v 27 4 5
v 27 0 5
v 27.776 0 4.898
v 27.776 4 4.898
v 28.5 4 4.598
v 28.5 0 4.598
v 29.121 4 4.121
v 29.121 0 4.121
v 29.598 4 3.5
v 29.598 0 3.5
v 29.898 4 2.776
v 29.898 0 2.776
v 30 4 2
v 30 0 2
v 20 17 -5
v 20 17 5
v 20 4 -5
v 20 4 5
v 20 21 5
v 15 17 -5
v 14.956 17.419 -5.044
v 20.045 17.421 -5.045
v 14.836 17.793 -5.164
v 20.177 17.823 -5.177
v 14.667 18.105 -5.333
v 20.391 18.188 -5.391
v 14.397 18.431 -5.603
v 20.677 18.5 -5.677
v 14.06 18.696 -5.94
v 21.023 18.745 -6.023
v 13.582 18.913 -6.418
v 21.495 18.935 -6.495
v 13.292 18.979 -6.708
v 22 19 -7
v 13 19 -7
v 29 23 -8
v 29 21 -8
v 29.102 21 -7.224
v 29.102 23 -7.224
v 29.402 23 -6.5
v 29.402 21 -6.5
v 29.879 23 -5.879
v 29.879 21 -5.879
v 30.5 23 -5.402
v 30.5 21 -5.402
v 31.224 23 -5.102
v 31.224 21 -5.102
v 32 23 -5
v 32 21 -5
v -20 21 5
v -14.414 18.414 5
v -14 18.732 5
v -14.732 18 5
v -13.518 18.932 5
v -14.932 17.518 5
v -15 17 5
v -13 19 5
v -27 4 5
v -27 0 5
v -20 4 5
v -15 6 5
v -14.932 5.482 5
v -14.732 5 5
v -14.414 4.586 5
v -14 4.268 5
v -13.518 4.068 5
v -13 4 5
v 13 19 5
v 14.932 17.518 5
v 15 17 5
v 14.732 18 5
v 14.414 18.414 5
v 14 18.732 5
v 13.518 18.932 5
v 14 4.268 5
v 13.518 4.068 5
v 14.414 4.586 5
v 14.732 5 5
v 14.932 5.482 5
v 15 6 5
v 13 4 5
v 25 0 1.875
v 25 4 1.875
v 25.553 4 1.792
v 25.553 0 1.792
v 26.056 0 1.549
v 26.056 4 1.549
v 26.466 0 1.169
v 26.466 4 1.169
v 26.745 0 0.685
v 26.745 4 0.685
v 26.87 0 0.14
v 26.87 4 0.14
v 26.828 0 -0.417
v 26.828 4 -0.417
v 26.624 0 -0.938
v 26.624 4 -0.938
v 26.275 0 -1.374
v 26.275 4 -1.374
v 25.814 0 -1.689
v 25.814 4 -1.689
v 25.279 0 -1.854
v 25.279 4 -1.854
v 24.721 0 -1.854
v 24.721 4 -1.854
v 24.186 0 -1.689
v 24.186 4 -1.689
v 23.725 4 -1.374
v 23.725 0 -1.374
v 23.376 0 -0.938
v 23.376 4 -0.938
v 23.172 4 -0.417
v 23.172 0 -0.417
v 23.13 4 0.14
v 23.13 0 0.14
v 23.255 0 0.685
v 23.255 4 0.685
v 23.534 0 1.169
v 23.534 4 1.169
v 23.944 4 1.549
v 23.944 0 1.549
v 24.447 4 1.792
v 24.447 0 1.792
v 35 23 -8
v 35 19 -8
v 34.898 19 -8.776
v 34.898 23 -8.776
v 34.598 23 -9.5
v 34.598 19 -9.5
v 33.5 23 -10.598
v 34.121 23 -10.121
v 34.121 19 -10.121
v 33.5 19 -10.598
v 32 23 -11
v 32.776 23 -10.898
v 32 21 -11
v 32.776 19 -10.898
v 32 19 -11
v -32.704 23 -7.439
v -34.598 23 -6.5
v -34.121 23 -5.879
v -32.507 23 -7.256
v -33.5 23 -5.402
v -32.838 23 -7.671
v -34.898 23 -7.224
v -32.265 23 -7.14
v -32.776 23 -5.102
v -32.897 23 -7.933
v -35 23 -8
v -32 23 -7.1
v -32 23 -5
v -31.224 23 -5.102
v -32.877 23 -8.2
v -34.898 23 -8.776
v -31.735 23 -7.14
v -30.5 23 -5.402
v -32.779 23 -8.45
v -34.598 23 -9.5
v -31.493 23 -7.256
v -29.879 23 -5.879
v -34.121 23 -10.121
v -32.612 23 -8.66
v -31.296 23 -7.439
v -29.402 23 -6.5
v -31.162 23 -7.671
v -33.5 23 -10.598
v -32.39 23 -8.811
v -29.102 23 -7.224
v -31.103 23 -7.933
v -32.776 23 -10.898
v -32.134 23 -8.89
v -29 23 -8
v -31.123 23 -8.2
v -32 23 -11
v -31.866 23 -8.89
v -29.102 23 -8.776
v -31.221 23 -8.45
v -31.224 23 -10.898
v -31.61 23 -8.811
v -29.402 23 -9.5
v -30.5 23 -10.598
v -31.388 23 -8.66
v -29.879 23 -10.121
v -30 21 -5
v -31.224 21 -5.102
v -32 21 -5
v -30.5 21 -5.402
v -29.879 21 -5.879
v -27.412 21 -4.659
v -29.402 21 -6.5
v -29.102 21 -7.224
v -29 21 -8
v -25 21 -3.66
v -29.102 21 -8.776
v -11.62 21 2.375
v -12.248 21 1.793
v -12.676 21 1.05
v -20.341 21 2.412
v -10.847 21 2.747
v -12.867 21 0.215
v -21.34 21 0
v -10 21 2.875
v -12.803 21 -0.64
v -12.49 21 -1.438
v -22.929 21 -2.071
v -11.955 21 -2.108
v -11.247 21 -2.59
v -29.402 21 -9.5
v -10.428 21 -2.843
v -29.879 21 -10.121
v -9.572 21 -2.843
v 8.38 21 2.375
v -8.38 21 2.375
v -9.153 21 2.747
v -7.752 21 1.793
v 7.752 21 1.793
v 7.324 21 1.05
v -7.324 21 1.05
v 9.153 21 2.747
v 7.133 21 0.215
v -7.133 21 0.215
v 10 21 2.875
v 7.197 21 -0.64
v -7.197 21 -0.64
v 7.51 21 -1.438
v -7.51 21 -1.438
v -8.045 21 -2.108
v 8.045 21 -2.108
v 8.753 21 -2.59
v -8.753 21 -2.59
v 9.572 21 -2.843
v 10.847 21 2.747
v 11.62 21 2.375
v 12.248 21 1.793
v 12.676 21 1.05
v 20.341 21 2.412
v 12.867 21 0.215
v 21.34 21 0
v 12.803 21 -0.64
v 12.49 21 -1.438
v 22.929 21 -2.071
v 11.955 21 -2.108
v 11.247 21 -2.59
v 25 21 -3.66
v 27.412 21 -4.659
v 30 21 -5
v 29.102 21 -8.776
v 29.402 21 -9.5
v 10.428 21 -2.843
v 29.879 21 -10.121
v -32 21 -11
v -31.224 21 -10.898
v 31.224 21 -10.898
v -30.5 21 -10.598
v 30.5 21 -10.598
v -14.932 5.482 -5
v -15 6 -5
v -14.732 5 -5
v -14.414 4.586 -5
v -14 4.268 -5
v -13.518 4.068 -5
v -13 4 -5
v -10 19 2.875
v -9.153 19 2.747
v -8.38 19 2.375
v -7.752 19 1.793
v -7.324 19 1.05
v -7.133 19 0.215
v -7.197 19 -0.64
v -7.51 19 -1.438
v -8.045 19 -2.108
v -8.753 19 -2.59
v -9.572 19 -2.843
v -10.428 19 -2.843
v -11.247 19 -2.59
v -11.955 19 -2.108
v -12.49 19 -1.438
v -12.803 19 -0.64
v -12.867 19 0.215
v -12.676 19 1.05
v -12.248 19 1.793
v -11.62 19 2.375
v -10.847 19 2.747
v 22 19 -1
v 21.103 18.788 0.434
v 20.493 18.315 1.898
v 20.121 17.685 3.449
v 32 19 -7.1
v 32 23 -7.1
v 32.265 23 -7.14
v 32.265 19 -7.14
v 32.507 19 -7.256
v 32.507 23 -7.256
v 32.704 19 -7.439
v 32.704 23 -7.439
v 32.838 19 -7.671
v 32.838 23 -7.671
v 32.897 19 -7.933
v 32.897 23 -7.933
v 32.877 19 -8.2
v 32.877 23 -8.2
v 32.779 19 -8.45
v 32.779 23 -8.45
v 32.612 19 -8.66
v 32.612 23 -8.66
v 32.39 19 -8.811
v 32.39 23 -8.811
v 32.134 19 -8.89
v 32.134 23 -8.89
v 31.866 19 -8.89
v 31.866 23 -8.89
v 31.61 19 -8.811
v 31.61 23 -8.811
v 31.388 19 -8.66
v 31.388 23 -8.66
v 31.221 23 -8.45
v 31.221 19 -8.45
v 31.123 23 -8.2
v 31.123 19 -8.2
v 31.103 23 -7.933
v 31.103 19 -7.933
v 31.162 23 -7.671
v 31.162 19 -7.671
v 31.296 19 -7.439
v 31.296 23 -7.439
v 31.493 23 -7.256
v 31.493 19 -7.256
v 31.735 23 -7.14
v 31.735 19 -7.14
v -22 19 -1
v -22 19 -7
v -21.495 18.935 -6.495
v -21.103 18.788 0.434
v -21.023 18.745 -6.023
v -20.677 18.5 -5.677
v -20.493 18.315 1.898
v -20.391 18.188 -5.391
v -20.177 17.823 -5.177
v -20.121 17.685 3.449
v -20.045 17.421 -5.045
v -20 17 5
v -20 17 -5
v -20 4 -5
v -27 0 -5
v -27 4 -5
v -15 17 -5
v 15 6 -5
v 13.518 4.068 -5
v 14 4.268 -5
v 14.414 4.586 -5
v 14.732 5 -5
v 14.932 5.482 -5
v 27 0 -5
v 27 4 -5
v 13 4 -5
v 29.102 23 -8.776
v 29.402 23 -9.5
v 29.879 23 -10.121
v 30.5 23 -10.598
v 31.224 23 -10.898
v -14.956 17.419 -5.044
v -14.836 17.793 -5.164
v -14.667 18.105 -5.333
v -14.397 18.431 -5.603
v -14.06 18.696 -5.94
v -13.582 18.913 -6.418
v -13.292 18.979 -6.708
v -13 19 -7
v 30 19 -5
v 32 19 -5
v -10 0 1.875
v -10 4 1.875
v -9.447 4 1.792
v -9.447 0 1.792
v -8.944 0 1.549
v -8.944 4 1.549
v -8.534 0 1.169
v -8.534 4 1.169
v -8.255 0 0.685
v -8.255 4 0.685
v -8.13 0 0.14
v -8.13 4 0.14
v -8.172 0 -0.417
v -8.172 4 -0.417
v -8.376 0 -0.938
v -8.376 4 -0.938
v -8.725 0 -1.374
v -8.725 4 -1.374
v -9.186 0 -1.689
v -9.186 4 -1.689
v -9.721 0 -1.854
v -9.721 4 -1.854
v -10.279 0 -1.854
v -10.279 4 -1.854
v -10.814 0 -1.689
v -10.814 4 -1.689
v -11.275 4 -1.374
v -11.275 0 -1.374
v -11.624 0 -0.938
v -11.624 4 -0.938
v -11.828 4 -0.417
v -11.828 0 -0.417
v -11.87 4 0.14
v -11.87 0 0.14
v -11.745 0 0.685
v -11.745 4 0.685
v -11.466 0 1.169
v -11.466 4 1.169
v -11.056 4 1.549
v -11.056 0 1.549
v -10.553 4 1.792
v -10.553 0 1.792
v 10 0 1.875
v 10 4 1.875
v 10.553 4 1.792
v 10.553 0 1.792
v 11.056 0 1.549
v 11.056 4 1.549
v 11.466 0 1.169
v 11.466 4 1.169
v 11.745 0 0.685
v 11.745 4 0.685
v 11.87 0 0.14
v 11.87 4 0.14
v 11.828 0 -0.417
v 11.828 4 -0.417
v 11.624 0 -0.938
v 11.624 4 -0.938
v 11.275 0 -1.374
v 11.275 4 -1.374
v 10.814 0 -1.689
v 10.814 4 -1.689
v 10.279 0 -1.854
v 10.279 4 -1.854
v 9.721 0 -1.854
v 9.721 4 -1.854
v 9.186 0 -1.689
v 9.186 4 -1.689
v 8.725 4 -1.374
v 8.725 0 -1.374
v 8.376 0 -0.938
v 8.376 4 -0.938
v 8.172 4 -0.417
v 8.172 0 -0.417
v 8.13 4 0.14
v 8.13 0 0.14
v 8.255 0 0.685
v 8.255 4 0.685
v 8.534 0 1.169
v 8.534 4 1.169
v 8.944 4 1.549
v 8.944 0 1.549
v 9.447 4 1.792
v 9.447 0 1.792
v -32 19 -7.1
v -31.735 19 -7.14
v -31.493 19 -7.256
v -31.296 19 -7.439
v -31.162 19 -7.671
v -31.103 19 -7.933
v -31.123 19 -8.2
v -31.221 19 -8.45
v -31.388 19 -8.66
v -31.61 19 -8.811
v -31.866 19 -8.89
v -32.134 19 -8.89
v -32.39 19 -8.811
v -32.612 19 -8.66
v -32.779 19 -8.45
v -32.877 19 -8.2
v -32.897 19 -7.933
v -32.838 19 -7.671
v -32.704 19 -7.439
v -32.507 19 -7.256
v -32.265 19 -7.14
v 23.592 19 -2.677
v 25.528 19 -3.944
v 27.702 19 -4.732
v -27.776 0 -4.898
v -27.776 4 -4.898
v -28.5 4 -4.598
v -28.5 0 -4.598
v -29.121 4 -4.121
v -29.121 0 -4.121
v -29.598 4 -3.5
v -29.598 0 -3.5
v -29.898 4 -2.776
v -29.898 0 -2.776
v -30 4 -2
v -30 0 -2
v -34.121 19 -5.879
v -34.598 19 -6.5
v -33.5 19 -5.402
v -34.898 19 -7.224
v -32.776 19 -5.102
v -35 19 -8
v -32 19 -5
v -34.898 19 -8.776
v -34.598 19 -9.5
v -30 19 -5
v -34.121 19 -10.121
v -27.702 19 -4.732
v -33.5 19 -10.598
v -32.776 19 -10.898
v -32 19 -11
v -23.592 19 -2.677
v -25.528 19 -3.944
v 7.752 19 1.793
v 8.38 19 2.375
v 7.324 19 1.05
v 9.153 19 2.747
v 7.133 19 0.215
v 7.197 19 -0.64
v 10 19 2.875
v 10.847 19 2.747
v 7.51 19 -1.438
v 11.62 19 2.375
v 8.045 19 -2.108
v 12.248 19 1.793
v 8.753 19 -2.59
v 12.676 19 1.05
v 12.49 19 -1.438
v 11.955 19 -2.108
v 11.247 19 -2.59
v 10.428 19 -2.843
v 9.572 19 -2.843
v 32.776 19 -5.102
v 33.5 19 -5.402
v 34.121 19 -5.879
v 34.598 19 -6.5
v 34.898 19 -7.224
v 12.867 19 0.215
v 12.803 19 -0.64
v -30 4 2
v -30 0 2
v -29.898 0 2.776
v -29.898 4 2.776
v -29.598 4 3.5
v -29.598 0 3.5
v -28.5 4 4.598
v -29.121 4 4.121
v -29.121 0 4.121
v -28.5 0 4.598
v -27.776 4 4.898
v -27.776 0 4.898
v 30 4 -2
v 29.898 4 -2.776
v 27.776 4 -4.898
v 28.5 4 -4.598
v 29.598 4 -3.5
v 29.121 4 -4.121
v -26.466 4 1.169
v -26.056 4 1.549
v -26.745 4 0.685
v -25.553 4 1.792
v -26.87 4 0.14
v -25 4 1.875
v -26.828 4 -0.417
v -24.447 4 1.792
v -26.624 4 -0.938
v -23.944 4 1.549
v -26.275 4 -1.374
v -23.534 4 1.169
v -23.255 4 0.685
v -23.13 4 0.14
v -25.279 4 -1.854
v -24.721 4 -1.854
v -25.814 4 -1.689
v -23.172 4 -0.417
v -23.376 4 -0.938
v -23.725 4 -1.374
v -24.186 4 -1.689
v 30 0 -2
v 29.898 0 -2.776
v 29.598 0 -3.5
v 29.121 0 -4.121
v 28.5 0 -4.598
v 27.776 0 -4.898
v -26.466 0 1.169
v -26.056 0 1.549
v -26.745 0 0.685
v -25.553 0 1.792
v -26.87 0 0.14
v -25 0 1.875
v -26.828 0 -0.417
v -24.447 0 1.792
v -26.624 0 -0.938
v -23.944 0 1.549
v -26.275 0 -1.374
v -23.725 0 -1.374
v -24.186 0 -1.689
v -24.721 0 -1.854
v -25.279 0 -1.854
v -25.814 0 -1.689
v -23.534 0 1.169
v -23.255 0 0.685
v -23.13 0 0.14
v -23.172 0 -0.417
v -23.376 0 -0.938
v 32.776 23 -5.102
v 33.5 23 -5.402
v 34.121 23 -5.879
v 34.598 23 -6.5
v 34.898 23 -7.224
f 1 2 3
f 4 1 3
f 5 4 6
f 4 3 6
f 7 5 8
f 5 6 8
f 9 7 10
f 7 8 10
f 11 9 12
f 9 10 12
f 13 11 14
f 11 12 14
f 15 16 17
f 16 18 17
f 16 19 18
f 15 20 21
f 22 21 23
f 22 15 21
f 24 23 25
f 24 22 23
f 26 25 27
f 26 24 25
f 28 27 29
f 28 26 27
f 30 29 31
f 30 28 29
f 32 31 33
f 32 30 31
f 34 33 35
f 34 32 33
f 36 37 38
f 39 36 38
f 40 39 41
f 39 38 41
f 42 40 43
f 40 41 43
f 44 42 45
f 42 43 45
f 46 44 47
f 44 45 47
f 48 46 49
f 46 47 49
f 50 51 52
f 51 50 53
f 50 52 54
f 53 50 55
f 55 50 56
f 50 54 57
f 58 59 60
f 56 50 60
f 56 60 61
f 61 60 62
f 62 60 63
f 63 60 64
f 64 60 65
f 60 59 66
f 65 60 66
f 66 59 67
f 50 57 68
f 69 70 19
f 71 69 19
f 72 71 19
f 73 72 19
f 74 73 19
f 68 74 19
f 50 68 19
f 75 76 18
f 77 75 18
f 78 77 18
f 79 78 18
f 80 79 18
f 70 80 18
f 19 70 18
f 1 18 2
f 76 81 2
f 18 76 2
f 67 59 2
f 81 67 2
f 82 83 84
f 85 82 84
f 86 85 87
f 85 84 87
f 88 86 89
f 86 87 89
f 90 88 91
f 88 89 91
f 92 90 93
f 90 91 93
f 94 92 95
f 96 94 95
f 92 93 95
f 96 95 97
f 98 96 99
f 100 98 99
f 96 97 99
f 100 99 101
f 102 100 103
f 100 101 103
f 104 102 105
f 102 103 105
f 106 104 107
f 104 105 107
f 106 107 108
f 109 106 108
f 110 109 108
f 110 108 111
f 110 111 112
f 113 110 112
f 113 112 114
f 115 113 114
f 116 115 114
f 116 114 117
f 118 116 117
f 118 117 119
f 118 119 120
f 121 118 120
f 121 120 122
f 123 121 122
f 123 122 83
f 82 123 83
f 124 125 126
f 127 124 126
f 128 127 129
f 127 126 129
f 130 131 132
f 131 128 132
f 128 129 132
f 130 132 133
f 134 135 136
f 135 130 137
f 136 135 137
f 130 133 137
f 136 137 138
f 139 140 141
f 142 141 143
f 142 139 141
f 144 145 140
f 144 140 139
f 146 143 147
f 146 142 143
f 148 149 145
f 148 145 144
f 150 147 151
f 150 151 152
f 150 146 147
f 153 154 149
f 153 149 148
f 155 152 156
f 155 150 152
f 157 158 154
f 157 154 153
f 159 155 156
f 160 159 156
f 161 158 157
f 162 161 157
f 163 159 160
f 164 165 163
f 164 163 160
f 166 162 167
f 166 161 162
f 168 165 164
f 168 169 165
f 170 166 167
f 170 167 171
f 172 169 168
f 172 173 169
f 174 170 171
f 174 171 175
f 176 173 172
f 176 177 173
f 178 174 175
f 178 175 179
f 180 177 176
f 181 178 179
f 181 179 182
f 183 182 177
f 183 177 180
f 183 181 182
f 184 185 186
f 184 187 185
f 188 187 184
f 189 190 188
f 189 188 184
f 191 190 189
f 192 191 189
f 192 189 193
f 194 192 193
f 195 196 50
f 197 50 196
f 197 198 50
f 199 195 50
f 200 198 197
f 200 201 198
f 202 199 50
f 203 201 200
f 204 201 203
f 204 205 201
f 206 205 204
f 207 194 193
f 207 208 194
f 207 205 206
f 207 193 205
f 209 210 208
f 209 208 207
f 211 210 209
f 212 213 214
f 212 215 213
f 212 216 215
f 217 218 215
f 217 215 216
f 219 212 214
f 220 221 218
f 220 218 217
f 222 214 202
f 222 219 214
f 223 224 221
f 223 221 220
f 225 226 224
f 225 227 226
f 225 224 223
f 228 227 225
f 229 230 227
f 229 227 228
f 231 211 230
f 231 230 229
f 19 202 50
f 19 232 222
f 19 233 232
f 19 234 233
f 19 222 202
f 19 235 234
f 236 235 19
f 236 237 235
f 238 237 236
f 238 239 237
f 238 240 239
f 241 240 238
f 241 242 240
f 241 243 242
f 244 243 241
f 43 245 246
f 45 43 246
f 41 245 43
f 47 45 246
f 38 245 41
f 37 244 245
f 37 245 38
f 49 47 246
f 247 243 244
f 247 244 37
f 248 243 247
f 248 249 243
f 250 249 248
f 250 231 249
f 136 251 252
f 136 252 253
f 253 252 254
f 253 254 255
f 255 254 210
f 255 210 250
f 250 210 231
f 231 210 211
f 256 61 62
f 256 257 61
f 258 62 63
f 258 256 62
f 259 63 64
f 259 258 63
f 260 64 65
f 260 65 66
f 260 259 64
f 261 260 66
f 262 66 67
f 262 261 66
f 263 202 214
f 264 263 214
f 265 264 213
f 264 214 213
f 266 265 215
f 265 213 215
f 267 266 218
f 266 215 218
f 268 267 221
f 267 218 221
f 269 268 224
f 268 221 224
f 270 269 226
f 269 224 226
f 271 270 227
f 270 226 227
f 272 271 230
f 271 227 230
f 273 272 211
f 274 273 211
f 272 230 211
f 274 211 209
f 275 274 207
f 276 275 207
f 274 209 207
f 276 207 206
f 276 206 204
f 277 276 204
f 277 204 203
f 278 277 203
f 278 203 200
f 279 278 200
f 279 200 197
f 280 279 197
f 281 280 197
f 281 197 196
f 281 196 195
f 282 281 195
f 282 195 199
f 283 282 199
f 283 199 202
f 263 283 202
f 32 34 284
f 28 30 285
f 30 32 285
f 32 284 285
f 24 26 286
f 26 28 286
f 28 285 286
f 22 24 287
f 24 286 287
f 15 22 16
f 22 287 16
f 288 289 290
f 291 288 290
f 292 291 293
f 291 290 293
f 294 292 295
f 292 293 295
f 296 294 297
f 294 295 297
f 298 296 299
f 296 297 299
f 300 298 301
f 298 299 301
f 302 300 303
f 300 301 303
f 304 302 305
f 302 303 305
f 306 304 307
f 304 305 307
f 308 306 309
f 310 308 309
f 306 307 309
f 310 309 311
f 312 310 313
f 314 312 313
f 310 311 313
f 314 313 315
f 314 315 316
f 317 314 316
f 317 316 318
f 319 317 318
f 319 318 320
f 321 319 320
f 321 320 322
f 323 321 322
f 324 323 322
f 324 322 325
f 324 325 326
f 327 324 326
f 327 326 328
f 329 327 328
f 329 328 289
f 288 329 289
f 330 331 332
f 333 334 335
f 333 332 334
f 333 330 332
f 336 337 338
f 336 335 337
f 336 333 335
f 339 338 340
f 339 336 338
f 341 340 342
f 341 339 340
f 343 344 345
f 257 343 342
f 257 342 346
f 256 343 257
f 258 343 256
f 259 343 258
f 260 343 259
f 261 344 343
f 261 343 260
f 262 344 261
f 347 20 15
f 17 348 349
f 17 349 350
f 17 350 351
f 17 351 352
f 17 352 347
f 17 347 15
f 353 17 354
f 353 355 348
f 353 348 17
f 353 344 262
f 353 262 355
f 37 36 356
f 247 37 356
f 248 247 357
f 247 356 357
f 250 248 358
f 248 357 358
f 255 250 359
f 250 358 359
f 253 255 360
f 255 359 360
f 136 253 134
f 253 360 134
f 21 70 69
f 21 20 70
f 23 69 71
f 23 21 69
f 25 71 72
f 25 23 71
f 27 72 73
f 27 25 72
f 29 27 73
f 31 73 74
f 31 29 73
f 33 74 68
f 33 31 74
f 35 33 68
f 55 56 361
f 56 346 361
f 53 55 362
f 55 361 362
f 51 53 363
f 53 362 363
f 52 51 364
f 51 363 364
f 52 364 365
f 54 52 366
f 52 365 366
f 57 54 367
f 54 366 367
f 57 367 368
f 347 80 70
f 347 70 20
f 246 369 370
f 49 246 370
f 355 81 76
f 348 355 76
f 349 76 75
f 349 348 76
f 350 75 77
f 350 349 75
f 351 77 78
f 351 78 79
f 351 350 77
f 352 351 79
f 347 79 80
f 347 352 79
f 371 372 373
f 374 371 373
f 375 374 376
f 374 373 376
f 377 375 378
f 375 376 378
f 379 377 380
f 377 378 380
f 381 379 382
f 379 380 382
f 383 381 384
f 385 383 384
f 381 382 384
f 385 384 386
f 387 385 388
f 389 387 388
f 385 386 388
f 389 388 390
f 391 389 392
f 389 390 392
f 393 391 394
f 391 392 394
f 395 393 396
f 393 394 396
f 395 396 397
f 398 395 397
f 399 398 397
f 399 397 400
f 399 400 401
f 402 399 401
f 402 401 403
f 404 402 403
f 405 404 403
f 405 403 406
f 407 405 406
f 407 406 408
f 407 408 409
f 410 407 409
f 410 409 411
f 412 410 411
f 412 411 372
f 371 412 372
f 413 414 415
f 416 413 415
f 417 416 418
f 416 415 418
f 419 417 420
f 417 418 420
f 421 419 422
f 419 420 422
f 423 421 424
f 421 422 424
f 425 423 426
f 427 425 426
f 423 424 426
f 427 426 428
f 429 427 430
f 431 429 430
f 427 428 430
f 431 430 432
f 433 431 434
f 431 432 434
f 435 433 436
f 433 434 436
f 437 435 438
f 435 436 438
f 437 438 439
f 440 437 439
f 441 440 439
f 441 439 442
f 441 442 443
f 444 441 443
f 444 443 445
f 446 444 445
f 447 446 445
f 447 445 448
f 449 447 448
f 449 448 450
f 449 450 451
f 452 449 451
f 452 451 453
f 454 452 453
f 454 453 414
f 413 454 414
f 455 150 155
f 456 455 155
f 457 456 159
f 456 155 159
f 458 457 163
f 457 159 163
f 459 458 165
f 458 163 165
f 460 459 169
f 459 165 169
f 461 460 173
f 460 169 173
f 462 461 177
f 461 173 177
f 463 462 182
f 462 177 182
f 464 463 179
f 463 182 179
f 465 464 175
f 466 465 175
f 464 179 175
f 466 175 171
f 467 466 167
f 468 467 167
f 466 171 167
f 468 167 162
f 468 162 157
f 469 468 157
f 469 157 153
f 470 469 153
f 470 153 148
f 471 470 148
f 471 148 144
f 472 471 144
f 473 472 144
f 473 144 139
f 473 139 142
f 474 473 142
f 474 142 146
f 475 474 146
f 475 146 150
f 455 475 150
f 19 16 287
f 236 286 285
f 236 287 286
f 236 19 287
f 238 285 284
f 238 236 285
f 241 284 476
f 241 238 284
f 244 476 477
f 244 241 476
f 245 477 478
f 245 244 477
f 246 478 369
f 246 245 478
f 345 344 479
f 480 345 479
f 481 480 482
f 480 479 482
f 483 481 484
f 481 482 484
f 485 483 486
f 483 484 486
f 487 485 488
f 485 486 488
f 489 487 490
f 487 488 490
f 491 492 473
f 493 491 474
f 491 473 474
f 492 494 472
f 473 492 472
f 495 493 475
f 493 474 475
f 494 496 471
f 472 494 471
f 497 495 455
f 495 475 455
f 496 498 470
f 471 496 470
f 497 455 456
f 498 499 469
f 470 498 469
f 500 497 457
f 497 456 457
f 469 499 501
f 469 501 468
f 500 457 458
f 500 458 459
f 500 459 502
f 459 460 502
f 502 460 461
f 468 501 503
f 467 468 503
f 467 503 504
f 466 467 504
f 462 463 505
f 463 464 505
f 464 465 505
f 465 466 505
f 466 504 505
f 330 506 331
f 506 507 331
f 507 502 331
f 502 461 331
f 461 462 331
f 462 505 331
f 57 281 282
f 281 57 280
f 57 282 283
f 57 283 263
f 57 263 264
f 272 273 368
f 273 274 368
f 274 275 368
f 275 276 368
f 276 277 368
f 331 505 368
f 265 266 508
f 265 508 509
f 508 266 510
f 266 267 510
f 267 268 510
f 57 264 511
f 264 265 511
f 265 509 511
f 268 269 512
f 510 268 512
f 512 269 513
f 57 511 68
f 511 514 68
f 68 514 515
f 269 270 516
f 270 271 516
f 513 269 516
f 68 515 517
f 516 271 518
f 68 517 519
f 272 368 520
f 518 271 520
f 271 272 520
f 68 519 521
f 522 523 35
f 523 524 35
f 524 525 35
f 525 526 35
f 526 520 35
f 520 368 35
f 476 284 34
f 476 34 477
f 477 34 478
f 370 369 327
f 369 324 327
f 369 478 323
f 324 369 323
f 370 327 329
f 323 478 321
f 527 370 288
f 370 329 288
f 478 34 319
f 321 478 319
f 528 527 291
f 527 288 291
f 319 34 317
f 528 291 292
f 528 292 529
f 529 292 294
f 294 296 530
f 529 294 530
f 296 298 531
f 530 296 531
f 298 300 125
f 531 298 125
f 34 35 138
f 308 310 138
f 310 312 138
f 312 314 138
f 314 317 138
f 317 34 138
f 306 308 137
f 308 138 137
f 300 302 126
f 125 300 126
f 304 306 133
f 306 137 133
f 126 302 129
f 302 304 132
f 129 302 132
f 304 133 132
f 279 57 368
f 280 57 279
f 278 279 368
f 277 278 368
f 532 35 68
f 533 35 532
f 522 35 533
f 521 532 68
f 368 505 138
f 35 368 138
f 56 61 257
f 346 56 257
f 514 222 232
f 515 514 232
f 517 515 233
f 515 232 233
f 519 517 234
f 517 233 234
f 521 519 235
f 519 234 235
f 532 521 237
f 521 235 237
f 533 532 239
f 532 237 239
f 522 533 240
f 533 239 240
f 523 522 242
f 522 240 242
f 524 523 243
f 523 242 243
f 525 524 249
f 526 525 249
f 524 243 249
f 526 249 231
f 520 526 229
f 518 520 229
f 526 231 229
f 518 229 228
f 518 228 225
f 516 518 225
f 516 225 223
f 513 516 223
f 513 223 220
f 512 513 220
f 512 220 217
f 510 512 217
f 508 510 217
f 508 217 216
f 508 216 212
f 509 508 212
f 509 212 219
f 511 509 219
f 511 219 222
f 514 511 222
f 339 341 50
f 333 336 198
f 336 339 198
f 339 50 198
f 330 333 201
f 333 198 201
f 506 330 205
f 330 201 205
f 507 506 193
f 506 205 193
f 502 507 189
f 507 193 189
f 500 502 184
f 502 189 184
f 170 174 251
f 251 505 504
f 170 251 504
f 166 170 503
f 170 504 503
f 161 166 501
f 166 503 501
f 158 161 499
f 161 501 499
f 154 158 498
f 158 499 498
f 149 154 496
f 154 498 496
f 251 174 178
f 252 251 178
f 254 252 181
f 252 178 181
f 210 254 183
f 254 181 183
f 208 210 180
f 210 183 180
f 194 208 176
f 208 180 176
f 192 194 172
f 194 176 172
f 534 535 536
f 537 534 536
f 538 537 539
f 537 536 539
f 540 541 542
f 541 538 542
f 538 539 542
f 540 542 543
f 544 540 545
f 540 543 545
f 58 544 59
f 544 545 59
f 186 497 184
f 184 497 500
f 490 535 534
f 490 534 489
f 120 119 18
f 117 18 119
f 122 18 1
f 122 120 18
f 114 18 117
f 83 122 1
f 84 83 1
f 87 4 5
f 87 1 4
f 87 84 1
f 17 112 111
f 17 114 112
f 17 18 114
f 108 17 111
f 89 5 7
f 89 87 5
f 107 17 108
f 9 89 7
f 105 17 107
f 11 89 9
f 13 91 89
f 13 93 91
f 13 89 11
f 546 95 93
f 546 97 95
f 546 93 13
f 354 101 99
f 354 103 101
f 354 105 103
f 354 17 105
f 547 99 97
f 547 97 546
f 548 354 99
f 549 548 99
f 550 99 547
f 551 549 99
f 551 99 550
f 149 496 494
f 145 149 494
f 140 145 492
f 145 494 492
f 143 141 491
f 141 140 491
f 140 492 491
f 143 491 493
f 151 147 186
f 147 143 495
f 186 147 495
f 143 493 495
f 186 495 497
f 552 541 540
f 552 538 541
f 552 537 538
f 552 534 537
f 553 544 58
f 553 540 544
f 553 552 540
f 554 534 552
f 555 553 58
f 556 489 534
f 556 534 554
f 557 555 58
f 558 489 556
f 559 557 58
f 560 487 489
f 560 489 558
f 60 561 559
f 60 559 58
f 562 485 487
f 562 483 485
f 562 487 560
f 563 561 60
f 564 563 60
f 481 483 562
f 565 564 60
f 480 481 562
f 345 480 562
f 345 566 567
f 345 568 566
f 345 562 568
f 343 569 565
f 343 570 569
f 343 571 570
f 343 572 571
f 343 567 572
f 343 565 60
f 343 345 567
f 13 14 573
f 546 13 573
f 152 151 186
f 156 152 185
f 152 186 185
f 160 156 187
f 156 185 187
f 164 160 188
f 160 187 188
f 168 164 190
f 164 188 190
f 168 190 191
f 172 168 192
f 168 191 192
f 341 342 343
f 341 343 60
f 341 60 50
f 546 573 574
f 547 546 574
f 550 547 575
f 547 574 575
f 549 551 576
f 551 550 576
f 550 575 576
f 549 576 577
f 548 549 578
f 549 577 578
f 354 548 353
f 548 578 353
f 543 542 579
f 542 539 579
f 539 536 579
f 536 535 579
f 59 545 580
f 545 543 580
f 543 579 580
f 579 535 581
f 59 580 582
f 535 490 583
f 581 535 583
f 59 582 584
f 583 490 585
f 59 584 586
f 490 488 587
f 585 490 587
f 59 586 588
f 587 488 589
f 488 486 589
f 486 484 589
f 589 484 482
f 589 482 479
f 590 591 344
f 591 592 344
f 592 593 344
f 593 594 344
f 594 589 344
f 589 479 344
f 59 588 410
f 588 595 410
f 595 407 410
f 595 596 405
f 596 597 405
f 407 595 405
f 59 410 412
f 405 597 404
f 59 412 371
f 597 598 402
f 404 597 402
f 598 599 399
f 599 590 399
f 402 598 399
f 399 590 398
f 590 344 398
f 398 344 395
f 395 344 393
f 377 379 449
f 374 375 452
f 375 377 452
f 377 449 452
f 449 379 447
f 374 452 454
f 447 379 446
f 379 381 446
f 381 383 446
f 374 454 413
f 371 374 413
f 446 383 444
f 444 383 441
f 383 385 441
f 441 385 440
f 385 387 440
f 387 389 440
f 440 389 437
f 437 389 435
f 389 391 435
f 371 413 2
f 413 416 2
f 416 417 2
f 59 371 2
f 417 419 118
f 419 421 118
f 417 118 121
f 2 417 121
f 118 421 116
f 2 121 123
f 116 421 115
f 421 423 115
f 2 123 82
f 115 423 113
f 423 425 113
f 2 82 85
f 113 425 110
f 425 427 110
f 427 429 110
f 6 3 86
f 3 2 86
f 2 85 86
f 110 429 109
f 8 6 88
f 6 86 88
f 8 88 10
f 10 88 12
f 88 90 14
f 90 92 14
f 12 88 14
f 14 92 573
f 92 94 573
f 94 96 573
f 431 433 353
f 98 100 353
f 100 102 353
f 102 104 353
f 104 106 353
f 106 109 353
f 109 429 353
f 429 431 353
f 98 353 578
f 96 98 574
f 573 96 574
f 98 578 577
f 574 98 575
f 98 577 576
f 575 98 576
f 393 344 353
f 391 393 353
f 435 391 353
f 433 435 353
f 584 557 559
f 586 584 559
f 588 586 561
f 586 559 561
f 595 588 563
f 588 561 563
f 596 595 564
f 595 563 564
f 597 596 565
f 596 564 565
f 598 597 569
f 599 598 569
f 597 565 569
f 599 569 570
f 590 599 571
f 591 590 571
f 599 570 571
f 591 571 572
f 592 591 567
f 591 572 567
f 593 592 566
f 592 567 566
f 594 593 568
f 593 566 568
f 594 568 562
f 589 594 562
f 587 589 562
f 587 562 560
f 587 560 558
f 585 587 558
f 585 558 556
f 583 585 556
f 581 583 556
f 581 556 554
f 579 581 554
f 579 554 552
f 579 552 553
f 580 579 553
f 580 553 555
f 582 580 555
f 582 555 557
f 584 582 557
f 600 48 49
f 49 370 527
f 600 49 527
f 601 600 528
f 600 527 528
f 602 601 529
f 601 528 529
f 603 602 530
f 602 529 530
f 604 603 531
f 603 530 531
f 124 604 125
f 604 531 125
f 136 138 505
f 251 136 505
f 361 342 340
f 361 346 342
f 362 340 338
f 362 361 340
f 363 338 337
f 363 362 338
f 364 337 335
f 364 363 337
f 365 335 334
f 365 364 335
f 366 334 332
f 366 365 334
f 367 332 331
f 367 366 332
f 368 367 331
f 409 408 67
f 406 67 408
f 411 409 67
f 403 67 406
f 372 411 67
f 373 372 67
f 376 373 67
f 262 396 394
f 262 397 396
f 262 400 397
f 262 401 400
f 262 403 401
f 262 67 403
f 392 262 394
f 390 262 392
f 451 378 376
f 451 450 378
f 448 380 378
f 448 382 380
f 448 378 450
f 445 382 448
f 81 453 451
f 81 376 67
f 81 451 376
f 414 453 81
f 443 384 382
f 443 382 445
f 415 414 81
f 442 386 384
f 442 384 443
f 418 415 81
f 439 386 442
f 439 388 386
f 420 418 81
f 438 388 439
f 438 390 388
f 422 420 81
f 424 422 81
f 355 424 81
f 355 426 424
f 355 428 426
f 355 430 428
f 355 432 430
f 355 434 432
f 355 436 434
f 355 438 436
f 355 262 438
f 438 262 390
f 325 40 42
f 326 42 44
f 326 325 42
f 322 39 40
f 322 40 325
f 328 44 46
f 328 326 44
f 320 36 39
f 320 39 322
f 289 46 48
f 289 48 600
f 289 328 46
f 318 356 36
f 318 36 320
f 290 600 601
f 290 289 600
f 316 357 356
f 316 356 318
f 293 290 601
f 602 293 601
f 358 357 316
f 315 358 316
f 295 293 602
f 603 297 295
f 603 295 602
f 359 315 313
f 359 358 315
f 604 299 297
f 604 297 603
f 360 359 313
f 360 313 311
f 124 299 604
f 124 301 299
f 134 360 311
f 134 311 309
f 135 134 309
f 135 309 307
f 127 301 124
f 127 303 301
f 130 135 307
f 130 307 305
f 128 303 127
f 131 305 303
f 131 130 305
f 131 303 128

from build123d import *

# Parameters (mm, degrees)
SKETCH1_W           = 60
SKETCH1_H           = 10
BOSS_EXTRUDE1_DEPTH = 4
SKETCH2_R           = 1.875
CUT_EXTRUDE1_DEPTH  = 31.6757233
SKETCH4_W           = 5
SKETCH4_H           = 10
BOSS_EXTRUDE2_DEPTH = 15
BOSS_EXTRUDE3_DEPTH = 4
SKETCH7_W           = 58
SKETCH7_H           = 6
CUT_EXTRUDE2_DEPTH  = 2
SKETCH9_W           = 40
SKETCH9_H           = 10
CUT_EXTRUDE3_DEPTH  = 2
CUT_EXTRUDE5_REACH  = 44.273
SKETCH10_R          = 2.875
FILLET1_R           = 10
FILLET2_R           = 3
FILLET3_R           = 2
SKETCH8_R           = 0.9
CUT_EXTRUDE4_DEPTH  = 44.301270189
FILLET4_R           = 2


# Some blends are built 0.0001 mm under size
with BuildPart() as part:
    # Sketch1 → Boss-Extrude1 (new body)
    with BuildSketch(Plane(origin=(0, 0, 0), x_dir=(1, 0, 0), z_dir=(0, 1, 0))):
        Rectangle(SKETCH1_W, SKETCH1_H)
    extrude(amount=BOSS_EXTRUDE1_DEPTH)

    # Sketch2 → Cut-Extrude1 (cut, through all)
    with BuildSketch(Plane(origin=(0, 4, 0), x_dir=(1, 0, 0), z_dir=(0, 1, 0))):
        with Locations(Location((-25, 0, 0), (0, 0, 270))):
            Circle(SKETCH2_R)
        with Locations(Location((-10, 0, 0), (0, 0, 270))):
            Circle(SKETCH2_R)
        with Locations(Location((10, 0, 0), (0, 0, 270))):
            Circle(SKETCH2_R)
        with Locations(Location((25, 0, 0), (0, 0, 270))):
            Circle(SKETCH2_R)
    extrude(amount=-CUT_EXTRUDE1_DEPTH, mode=Mode.SUBTRACT)

    # Sketch4 → Boss-Extrude2 (add)
    with BuildSketch(Plane(origin=(0, 4, 0), x_dir=(1, 0, 0), z_dir=(0, 1, 0))):
        with Locations((-17.5, 0)):
            Rectangle(SKETCH4_W, SKETCH4_H)
        with Locations((17.5, 0)):
            Rectangle(SKETCH4_W, SKETCH4_H)
    extrude(amount=BOSS_EXTRUDE2_DEPTH)

    # Sketch5 → Boss-Extrude3 (add)
    with BuildSketch(Plane(origin=(0, 19, 0), x_dir=(1, 0, 0), z_dir=(0, 1, 0))):
        Polygon((-20, -5), (20, -5), (20, 5), (35, 5), (35, 11), (-35, 11), (-35, 5), (-20, 5), align=None)
    extrude(amount=BOSS_EXTRUDE3_DEPTH)

    # Sketch7 → Cut-Extrude2 (cut)
    with BuildSketch(Plane(origin=(0, 23, 0), x_dir=(1, 0, 0), z_dir=(0, 1, 0))):
        with Locations((0, 8)):
            Rectangle(SKETCH7_W, SKETCH7_H)
    extrude(amount=-CUT_EXTRUDE2_DEPTH, mode=Mode.SUBTRACT)

    # Sketch9 → Cut-Extrude3 (cut)
    with BuildSketch(Plane(origin=(0, 23, 0), x_dir=(1, 0, 0), z_dir=(0, 1, 0))):
        Rectangle(SKETCH9_W, SKETCH9_H)
    extrude(amount=-CUT_EXTRUDE3_DEPTH, mode=Mode.SUBTRACT)

    # Sketch10 → Cut-Extrude5 (cut, up to next)
    with BuildSketch(Plane(origin=(0, 21, 0), x_dir=(1, 0, 0), z_dir=(0, 1, 0)), mode=Mode.PRIVATE) as cut_extrude5_sk1:
        with Locations(Location((-10, 0, 0), (0, 0, 270))):
            Circle(SKETCH10_R)
    cut_extrude5_tool1 = extrude(cut_extrude5_sk1.sketch, amount=-CUT_EXTRUDE5_REACH, mode=Mode.PRIVATE) & part.part
    # Sketch10 → Cut-Extrude5 (cut, up to next)
    with BuildSketch(Plane(origin=(0, 21, 0), x_dir=(1, 0, 0), z_dir=(0, 1, 0)), mode=Mode.PRIVATE) as cut_extrude5_sk2:
        with Locations(Location((10, 0, 0), (0, 0, 270))):
            Circle(SKETCH10_R)
    cut_extrude5_tool2 = extrude(cut_extrude5_sk2.sketch, amount=-CUT_EXTRUDE5_REACH, mode=Mode.PRIVATE) & part.part
    add(cut_extrude5_tool1.solids().sort_by_distance((-10, 21, 0))[0], mode=Mode.SUBTRACT)
    add(cut_extrude5_tool2.solids().sort_by_distance((10, 21, 0))[0], mode=Mode.SUBTRACT)

    # Fillet1
    fillet1_edges = [part.edges().sort_by_distance(p)[0] for p in [
        (20, 20, -5),
        (-20, 20, -5),
    ]]
    fillet(fillet1_edges, radius=FILLET1_R - 0.0001)  # a hair under: the kernel refuses the full size

    # Fillet2
    # the kernel refuses this fillet: 3 mm, written as the material it takes off along each edge
    with BuildSketch(Plane(origin=(30, -7.5, -5), x_dir=(-1, 0, 0), z_dir=(0, 1, 0)), Plane(origin=(-30, -7.5, 5), x_dir=(1, 0, 0), z_dir=(0, 1, 0)), Plane(origin=(-35, 11.5, -5), x_dir=(1, 0, 0), z_dir=(0, 1, 0)), Plane(origin=(35, 11.5, -11), x_dir=(-1, 0, 0), z_dir=(0, 1, 0))) as fillet2_piece_1:
        with BuildLine():
            CenterArc((FILLET2_R, FILLET2_R), FILLET2_R, 180, 90)
            Line((0, FILLET2_R), (0, 0))
            Line((0, 0), (FILLET2_R, 0))
        make_face()
    fillet2_piece_1_solid = extrude(amount=19, mode=Mode.PRIVATE)
    with BuildSketch(Plane(origin=(30, -7.5, 5), x_dir=(-1, 0, 0), z_dir=(0, 1, 0)), Plane(origin=(-30, -7.5, -5), x_dir=(1, 0, 0), z_dir=(0, 1, 0)), Plane(origin=(-35, 11.5, -11), x_dir=(1, 0, 0), z_dir=(0, 1, 0)), Plane(origin=(35, 11.5, -5), x_dir=(-1, 0, 0), z_dir=(0, 1, 0))) as fillet2_piece_2:
        with BuildLine():
            CenterArc((FILLET2_R, -FILLET2_R), FILLET2_R, 90, 90)
            Line((0, -FILLET2_R), (0, 0))
            Line((0, 0), (FILLET2_R, 0))
        make_face()
    fillet2_piece_2_solid = extrude(amount=19, mode=Mode.PRIVATE)
    with BuildSketch(Plane(origin=(-29, 30.5, -11), x_dir=(0, 0, 1), z_dir=(0, -1, 0)), Plane(origin=(29, 30.5, -11), x_dir=(1, 0, 0), z_dir=(0, -1, 0))) as fillet2_piece_3:
        with BuildLine():
            CenterArc((FILLET2_R, FILLET2_R), FILLET2_R, 180, 90)
            Line((0, FILLET2_R), (0, 0))
            Line((0, 0), (FILLET2_R, 0))
        make_face()
    fillet2_piece_3_solid = extrude(amount=9.5, mode=Mode.PRIVATE)
    with BuildSketch(Plane(origin=(-29, 21, -4.949883917), x_dir=(-0.9998604946563736, 0, -0.016703030428994153), z_dir=(0, 1, 0))) as fillet2_piece_4:
        with BuildLine():
            CenterArc((3.050527666, -2.999581484), FILLET2_R, 90.957057654, 90)
            Line((0.050946182, -3.049690575), (-0.249011967, -3.054701484))
            Line((-0.249011967, -3.054701484), (-0.299958148, -0.005010909))
            Line((-0.299958148, -0.005010909), (0.025007319, 0.298955906))
            ThreePointArc((0.025007319, 0.298955906), (0.99558669, 0.266550417), (2.995407665, 0.299958148))
            Line((2.995407665, 0.299958148), (3.000418574, 0))
        make_face()
    fillet2_piece_4_solid = extrude(amount=9.625290207, mode=Mode.PRIVATE)
    with BuildSketch(Plane(origin=(29, 21, -4.949883917), x_dir=(0.9998604946563736, 0, -0.01670303042899439), z_dir=(0, 1, 0))) as fillet2_piece_5:
        with BuildLine():
            CenterArc((3.050527666, 2.999581484), FILLET2_R, 179.042942346, 90)
            Line((0.050946182, 3.049690575), (-0.249011967, 3.054701484))
            Line((-0.249011967, 3.054701484), (-0.299958148, 0.005010909))
            Line((-0.299958148, 0.005010909), (0.025007319, -0.298955906))
            ThreePointArc((0.025007319, -0.298955906), (0.99558669, -0.266550417), (2.995407665, -0.299958148))
            Line((2.995407665, -0.299958148), (3.000418574, 0))
        make_face()
    fillet2_piece_5_solid = extrude(amount=9.625290207, mode=Mode.PRIVATE)
    add([fillet2_piece_1_solid, fillet2_piece_2_solid, fillet2_piece_3_solid, fillet2_piece_4_solid, fillet2_piece_5_solid], mode=Mode.SUBTRACT)

    # Fillet3
    fillet3_edges = [part.edges().sort_by_distance(p)[0] for p in [
        (-15, 4, 0),
        (-15, 19, 0),
        (15, 4, 0),
        (15, 19, 0),
    ]]
    fillet(fillet3_edges, radius=FILLET3_R)

    # Sketch8 → Cut-Extrude4 (cut, through all)
    with BuildSketch(Plane(origin=(0, 23, 0), x_dir=(1, 0, 0), z_dir=(0, 1, 0))):
        with Locations(Location((32, 8, 0), (0, 0, 270))):
            Circle(SKETCH8_R)
        with Locations(Location((-32, 8, 0), (0, 0, 270))):
            Circle(SKETCH8_R)
    extrude(amount=-CUT_EXTRUDE4_DEPTH, mode=Mode.SUBTRACT)

    # Fillet4
    fillet4_edges = [part.edges().sort_by_distance(p)[0] for p in [
        (-16.5, 19, -5),
        (16.5, 19, -5),
        (-20, 19, -5e-05),
        (20, 19, -5e-05),
    ]]
    fillet(fillet4_edges, radius=FILLET4_R - 0.0001)  # a hair under: the kernel refuses the full size


solid = part.part
